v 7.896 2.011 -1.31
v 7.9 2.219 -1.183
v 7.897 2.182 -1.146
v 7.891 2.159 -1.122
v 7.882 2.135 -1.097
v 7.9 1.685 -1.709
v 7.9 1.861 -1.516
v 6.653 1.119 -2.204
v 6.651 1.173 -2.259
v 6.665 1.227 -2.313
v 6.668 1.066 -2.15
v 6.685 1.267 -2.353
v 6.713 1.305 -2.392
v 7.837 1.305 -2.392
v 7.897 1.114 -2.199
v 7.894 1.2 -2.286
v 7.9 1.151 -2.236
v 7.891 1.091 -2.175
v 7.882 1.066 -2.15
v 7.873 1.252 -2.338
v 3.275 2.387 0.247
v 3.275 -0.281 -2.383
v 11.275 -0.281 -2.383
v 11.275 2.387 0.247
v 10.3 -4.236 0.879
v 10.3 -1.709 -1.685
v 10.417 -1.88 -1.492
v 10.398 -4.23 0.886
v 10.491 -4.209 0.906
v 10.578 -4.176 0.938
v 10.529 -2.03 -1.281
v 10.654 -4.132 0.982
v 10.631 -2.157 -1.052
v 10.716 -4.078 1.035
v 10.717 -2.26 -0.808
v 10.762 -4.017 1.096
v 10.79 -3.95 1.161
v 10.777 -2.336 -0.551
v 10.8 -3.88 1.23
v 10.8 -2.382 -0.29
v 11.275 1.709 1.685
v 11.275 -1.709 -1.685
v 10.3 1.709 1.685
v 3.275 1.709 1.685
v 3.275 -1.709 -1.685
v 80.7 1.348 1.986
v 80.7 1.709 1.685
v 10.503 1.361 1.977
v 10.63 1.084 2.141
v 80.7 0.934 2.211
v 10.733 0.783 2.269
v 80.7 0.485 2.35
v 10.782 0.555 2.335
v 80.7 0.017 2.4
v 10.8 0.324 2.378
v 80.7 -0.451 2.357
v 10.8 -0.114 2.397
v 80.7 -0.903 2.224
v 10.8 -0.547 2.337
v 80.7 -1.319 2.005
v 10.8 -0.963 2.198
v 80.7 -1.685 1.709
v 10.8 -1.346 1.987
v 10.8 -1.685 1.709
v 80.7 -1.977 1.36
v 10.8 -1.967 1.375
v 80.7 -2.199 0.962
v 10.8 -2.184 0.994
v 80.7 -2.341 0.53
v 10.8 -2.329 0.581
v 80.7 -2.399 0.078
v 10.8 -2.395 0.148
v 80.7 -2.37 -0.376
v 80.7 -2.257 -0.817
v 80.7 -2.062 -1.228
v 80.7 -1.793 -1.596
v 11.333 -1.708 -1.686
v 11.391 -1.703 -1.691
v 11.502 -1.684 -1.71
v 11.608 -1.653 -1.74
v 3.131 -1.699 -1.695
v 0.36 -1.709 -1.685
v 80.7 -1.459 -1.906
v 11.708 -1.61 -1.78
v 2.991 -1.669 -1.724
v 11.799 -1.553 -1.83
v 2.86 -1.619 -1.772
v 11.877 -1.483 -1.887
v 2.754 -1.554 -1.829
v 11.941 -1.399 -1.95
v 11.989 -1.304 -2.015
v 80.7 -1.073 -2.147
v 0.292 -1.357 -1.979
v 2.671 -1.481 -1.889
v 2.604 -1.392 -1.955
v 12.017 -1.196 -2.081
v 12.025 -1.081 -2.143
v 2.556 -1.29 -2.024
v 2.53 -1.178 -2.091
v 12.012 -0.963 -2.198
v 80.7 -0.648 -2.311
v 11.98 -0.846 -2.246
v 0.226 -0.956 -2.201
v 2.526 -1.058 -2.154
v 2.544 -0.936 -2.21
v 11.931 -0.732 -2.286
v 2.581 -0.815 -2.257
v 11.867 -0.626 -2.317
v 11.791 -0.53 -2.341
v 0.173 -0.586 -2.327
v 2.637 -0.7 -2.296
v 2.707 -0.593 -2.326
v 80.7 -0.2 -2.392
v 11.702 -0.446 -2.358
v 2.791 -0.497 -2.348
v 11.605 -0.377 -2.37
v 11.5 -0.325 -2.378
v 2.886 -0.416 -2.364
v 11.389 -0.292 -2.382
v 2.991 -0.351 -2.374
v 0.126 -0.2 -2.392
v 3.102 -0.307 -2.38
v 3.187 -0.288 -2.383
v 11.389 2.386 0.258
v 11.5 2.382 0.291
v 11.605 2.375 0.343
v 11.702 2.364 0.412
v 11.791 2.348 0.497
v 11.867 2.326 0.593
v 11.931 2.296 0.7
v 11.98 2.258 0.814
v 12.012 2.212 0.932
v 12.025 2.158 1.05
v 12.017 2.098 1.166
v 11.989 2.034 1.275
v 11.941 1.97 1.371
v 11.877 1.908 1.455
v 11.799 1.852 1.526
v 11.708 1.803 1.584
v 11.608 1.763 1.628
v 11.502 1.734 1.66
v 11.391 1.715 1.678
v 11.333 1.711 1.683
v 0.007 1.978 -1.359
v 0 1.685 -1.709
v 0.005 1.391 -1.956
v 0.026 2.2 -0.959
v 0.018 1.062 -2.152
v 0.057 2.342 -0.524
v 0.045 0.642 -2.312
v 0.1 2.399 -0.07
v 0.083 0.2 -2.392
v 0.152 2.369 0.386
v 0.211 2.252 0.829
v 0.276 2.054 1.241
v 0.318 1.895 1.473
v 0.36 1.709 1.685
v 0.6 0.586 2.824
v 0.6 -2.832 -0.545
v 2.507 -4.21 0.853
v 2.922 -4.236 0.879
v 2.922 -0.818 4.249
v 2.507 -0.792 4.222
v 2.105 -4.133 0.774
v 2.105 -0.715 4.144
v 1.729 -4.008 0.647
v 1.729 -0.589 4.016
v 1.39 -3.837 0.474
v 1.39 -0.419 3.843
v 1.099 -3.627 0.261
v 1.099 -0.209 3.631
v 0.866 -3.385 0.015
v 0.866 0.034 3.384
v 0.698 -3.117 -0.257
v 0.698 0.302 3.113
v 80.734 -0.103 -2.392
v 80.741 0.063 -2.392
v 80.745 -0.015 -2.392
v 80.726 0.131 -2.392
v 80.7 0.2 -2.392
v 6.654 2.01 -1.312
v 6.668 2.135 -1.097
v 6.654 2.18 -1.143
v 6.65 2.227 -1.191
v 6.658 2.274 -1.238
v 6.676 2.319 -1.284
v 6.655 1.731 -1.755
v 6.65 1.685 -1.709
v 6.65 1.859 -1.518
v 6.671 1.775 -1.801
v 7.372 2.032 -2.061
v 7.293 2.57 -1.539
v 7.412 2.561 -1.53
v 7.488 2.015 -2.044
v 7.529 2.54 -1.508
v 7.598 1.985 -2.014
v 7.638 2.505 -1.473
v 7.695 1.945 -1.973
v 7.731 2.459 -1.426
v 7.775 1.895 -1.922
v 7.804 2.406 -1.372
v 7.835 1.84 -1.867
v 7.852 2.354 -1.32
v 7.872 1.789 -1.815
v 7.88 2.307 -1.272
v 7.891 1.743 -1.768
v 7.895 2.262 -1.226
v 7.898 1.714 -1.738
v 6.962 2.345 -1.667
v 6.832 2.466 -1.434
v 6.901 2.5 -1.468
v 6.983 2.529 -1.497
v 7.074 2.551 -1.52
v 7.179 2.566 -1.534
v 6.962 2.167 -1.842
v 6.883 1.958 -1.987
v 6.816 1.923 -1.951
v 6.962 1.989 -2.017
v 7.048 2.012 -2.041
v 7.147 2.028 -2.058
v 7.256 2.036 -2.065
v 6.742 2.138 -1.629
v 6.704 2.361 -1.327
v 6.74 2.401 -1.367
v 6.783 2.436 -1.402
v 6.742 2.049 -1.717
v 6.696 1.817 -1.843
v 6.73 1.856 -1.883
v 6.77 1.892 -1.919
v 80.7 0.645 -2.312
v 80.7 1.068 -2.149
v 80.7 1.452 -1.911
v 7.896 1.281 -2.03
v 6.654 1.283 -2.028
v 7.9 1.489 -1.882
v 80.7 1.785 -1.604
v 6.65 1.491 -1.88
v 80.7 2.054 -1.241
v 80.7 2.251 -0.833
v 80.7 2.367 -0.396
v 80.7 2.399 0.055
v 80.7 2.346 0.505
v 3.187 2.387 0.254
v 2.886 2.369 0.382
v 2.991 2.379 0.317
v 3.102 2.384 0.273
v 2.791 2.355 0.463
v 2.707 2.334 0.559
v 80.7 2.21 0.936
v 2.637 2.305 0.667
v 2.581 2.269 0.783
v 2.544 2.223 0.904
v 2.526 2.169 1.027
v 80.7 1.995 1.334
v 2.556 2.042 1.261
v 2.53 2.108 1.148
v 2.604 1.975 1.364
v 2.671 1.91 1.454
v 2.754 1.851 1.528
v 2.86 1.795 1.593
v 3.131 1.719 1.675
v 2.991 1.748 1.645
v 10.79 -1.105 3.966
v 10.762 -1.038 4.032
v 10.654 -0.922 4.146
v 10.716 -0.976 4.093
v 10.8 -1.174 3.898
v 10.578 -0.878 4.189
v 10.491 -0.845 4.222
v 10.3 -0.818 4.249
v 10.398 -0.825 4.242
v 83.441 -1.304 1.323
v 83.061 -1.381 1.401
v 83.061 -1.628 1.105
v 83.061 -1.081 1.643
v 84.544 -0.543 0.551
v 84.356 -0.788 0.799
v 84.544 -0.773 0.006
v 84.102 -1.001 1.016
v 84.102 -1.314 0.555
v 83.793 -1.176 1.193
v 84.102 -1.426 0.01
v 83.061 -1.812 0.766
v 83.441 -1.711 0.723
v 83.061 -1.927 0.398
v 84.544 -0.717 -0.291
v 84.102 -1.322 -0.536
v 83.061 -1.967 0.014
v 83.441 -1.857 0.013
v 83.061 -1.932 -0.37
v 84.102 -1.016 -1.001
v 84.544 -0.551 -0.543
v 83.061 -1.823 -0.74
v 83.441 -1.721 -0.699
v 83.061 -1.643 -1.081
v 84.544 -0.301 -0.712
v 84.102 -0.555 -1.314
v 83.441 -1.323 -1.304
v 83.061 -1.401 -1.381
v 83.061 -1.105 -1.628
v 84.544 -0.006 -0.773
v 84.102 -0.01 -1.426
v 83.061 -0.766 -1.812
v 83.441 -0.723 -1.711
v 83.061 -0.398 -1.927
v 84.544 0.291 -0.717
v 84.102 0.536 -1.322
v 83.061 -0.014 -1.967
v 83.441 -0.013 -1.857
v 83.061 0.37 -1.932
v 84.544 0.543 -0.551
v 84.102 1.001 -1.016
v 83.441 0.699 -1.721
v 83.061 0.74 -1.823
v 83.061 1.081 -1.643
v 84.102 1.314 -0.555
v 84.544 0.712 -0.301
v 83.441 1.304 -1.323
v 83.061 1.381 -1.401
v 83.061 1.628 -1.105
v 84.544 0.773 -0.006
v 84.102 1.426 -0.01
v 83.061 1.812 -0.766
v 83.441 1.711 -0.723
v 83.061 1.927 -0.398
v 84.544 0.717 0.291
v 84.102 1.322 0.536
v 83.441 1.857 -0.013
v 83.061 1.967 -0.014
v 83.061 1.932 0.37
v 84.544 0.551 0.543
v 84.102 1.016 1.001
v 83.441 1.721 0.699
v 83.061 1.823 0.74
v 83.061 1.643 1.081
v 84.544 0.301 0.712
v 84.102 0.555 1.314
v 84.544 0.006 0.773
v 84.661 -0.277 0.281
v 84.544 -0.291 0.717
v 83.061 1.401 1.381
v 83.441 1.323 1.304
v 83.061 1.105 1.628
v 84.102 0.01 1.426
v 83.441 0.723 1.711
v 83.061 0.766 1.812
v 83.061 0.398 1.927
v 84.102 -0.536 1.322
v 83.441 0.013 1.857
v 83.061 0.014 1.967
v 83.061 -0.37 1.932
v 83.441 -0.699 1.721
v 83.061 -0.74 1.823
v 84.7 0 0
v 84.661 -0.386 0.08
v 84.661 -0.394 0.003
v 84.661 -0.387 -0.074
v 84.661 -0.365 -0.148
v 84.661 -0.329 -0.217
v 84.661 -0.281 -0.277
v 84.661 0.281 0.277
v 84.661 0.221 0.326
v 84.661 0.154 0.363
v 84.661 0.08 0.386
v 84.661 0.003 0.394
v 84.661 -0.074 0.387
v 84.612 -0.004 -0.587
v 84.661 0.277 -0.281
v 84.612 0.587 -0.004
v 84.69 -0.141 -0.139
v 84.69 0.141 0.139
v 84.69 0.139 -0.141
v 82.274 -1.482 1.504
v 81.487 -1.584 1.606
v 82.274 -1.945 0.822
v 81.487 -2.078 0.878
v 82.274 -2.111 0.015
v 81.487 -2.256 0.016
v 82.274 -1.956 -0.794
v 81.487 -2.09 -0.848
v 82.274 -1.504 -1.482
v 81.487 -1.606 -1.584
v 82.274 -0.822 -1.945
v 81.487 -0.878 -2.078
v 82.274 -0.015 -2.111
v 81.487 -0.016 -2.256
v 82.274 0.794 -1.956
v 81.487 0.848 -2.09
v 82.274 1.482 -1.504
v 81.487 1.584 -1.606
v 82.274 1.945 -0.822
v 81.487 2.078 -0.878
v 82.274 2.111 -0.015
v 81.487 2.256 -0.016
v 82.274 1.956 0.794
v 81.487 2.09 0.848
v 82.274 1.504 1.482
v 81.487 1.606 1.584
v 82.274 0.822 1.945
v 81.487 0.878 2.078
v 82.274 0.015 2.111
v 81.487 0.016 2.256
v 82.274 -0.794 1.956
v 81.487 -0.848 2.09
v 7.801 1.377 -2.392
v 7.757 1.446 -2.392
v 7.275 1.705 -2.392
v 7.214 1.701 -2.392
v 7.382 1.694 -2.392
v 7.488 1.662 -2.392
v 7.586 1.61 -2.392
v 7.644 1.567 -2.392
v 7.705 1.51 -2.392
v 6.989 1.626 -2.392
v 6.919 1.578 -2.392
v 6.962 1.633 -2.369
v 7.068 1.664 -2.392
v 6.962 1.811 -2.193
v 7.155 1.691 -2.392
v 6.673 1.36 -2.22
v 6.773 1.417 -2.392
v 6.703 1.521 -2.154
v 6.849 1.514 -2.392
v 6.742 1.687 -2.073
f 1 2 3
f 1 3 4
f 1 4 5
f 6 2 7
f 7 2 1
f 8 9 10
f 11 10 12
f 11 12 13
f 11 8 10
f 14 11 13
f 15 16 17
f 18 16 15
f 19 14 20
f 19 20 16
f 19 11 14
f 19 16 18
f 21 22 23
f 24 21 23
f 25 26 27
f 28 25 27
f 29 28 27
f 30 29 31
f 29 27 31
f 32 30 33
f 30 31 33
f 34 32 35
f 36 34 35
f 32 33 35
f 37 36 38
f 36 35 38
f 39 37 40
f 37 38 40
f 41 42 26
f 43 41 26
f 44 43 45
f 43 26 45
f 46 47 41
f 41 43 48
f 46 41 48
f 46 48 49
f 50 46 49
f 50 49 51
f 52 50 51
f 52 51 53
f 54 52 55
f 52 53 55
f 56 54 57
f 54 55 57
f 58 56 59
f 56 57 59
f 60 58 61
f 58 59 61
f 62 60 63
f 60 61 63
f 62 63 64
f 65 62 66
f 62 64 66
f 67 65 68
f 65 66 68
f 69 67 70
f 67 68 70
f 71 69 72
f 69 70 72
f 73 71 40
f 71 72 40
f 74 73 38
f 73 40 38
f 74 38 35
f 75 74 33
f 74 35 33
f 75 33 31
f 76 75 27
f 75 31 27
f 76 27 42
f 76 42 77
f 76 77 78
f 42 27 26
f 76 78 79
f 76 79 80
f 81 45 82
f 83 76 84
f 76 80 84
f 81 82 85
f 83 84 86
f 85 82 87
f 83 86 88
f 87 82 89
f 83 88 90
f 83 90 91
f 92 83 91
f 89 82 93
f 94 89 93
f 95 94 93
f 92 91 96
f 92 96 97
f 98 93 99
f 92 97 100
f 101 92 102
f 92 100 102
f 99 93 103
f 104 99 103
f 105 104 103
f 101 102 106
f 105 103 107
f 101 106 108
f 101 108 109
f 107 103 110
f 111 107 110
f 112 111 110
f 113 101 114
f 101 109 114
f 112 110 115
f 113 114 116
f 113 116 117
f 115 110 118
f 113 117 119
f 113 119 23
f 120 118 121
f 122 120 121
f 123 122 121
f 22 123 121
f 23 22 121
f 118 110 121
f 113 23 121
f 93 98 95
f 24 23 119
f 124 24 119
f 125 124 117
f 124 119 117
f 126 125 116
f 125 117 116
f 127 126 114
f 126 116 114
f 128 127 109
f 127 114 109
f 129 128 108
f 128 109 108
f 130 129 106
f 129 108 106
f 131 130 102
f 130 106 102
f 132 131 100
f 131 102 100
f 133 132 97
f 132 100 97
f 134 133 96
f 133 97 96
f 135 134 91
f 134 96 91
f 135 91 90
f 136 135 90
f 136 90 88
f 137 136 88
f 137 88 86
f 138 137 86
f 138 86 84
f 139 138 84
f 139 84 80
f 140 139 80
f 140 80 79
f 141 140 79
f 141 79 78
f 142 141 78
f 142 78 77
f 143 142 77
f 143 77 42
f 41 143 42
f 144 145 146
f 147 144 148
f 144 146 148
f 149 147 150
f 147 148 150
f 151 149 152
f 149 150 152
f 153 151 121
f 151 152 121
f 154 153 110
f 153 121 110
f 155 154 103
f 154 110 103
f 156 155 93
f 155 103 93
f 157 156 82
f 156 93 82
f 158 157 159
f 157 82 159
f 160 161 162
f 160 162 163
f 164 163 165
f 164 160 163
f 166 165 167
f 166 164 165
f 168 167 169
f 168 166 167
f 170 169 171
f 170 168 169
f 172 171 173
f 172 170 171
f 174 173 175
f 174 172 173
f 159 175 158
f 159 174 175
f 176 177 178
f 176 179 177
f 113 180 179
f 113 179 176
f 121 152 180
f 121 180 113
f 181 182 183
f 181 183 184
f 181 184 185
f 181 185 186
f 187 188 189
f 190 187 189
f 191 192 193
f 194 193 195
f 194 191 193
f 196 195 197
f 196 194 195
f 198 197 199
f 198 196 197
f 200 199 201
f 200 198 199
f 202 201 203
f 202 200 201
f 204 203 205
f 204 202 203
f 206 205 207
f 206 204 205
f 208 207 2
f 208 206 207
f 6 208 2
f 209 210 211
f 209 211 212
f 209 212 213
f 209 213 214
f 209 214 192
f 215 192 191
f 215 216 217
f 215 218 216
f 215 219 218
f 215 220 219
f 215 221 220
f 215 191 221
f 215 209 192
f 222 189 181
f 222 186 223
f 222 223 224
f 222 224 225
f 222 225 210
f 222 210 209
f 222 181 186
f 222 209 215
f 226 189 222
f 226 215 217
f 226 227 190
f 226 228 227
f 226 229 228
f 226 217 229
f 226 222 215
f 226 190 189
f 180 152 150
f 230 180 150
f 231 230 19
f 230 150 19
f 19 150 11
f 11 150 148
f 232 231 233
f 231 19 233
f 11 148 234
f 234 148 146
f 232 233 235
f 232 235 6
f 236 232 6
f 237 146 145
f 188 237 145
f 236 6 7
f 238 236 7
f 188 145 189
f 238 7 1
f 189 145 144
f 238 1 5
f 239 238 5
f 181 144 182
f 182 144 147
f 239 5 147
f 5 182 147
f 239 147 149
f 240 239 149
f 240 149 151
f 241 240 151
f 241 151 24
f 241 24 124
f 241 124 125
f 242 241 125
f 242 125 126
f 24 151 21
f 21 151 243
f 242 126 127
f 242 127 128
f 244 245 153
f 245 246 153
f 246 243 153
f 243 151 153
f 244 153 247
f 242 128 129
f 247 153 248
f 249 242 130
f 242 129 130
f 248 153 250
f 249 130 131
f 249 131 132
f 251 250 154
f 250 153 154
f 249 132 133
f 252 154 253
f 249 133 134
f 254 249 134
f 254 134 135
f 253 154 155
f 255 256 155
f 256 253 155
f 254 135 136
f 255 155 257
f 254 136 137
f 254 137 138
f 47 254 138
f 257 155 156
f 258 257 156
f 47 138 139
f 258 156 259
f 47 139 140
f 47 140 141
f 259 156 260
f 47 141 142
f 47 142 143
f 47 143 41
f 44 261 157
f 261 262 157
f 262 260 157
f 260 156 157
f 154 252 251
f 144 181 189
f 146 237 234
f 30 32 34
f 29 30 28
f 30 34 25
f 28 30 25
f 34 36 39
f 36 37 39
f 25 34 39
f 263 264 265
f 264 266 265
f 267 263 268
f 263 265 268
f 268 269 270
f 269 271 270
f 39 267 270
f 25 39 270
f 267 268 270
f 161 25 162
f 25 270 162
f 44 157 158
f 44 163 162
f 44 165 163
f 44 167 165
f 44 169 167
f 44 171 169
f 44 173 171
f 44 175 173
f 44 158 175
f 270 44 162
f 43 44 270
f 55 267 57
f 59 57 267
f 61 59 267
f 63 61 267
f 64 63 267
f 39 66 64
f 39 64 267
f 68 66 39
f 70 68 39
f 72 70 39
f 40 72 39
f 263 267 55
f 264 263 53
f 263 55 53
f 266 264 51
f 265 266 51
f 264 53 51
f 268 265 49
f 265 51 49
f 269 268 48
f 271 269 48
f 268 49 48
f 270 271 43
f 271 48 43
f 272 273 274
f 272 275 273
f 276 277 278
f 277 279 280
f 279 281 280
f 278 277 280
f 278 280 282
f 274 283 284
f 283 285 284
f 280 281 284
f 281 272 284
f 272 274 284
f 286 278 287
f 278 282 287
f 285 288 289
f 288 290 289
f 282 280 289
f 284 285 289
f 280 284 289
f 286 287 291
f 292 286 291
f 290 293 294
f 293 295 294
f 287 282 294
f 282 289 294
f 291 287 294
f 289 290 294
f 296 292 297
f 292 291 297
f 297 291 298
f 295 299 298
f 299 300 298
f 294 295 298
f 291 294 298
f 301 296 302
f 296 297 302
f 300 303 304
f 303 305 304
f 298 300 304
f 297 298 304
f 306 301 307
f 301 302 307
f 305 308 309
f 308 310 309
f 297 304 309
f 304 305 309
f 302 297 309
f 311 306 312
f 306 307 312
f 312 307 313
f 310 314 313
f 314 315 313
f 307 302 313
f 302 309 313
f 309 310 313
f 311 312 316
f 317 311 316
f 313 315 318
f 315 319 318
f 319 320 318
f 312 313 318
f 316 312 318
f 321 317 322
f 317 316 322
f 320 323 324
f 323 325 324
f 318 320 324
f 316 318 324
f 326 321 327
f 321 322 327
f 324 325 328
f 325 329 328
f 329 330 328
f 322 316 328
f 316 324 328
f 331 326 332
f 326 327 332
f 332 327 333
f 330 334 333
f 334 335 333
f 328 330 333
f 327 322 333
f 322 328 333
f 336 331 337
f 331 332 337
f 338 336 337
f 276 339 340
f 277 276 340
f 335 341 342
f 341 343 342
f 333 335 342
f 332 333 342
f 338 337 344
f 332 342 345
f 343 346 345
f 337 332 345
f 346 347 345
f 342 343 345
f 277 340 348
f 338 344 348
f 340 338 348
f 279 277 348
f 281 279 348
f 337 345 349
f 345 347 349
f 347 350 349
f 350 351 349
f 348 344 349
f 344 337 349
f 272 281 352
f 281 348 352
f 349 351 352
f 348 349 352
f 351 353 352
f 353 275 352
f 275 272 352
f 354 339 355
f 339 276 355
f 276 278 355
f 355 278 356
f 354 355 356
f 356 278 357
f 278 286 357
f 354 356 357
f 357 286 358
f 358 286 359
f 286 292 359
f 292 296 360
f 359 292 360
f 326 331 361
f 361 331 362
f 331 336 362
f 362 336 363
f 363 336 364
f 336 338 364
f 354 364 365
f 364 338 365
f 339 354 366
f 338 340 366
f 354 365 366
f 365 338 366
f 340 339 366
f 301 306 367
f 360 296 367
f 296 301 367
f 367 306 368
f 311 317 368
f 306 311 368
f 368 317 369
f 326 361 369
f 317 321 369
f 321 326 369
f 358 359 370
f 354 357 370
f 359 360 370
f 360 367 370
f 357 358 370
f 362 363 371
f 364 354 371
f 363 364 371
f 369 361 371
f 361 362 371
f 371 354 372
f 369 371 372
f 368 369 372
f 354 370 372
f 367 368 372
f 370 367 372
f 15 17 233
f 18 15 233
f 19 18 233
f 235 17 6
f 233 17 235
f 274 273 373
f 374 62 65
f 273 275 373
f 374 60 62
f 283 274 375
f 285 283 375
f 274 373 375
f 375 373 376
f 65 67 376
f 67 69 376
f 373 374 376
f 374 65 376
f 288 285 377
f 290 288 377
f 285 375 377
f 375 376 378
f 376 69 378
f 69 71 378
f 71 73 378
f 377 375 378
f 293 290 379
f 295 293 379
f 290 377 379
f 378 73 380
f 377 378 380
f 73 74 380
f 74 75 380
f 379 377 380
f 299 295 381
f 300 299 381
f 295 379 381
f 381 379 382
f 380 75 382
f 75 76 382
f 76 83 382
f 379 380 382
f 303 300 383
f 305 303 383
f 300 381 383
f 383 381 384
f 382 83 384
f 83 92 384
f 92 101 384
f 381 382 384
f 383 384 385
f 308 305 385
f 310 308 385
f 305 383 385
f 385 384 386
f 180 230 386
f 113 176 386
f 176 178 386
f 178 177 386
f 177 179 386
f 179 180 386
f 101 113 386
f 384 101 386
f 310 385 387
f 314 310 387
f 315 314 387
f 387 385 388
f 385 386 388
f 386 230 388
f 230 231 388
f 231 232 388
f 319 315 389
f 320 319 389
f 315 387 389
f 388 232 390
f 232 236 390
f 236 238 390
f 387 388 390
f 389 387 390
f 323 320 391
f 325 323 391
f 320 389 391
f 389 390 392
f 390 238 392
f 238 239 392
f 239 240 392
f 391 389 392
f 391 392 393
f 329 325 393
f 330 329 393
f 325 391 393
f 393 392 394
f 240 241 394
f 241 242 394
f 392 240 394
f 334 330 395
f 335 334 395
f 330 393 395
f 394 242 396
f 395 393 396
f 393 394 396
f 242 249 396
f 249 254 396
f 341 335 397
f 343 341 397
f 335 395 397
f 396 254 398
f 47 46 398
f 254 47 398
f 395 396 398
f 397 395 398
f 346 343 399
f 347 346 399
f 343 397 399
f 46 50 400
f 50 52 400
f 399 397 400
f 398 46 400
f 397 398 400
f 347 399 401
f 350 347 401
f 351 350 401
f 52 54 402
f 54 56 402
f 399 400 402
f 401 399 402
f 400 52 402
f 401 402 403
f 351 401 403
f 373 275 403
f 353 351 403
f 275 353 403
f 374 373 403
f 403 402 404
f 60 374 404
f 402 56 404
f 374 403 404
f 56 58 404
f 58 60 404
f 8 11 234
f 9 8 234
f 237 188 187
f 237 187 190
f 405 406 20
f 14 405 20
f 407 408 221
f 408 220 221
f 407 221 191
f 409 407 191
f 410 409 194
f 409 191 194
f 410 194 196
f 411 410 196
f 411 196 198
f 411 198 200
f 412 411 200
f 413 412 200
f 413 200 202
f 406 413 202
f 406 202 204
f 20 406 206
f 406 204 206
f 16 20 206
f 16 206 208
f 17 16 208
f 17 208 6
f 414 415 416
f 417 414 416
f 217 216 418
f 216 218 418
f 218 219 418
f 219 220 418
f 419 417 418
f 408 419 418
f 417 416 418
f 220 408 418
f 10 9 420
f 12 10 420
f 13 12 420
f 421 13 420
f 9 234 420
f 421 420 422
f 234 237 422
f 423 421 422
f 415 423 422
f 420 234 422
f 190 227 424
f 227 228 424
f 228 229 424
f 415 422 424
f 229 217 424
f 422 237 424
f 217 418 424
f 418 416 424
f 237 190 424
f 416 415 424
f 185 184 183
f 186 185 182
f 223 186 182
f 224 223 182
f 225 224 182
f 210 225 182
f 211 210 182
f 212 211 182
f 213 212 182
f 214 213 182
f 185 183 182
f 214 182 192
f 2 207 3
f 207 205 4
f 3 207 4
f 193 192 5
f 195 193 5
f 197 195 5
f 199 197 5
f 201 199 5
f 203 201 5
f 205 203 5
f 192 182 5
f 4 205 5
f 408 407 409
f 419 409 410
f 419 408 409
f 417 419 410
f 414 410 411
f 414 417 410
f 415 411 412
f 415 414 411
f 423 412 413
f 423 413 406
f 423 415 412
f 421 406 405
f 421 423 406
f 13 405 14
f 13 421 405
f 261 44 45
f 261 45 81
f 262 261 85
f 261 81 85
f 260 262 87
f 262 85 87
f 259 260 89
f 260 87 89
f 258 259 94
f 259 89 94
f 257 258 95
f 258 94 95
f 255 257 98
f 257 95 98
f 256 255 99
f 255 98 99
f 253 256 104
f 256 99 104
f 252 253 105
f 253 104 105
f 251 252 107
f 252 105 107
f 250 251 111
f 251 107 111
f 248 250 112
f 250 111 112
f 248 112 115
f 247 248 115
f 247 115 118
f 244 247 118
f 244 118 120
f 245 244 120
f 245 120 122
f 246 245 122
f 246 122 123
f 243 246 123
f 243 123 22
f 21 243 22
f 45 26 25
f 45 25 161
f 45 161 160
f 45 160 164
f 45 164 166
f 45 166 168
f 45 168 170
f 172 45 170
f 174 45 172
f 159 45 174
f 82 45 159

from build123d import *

# Parameters (mm, degrees)
SKETCH_R             = 2.4
PAD_DEPTH            = 84.7
PAD001_DEPTH         = 3.6
POCKET_DEPTH         = 5
PAD002_DEPTH         = 0.75
PAD002_DEPTH_BACK    = 0.75
POCKET001_DEPTH      = 10
POCKET002_DEPTH      = 100
POCKET002_DEPTH_BACK = -100
BODY_PLACEMENT_ANGLE = 44.59


with BuildPart() as part:
    # Sketch → Pad (new body)
    with BuildSketch(Plane.YZ):
        Circle(SKETCH_R)
    extrude(amount=PAD_DEPTH)

    # Sketch001 → Pad001 (join)
    with BuildSketch(Plane.XY):
        with BuildLine():
            Line((0, 2.4), (10.3, 2.4))
            ThreePointArc((10.8, 1.9), (10.653553, 2.253553), (10.3, 2.4))
            Line((10.8, 1.9), (10.8, -1.9))
            ThreePointArc((10.3, -2.4), (10.653553, -2.253553), (10.8, -1.9))
            Line((10.3, -2.4), (0, -2.4))
            Line((0, -2.4), (0, 2.4))
        make_face()
    extrude(amount=PAD001_DEPTH)

    # Sketch002 (on Face7 of Pad001) → Pocket (cut)
    with BuildSketch(Plane(origin=(0, -2.4, 0), x_dir=(0, 0, -1), z_dir=(0, -1, 0))):
        with BuildLine():
            Line((2.4, 0), (-1.6, 0.6))
            ThreePointArc((-3.6, 2.922375), (-3.031088, 1.38994), (-1.6, 0.6))
            Line((-3.6, 2.922375), (-4.6, 2.922375))
            Line((-4.6, 2.922375), (-4.6, -1))
            Line((-4.6, -1), (2.4, -1))
            Line((2.4, -1), (2.4, 0))
        make_face()
    extrude(amount=-POCKET_DEPTH, mode=Mode.SUBTRACT)

    # Sketch003 → Pad002 (join, two sides)
    with BuildSketch(Plane.XZ) as pad002_sk:
        with BuildLine():
            add(Edge.make_bspline(
                [(7.9, -2.4), (7.9, -1.533975), (6.9625, -1.966987), (6.025, -2.4), (6.9625, -2.833013), (7.9, -3.266025), (7.9, -2.4)],
                knots=[0, 0, 0, 2.094395, 2.094395, 4.18879, 4.18879, 6.283185, 6.283185, 6.283185], degree=2, weights=[1, 0.5, 1, 0.5, 1, 0.5, 1]))
        make_face()
    extrude(amount=PAD002_DEPTH)
    extrude(pad002_sk.sketch, amount=-PAD002_DEPTH_BACK)

    # Sketch004 (on Face6 of Pad002) → Pocket001 (cut)
    with BuildSketch(Plane(origin=(0, -2.4, 0), x_dir=(0, 0, -1), z_dir=(0, -1, 0))):
        with BuildLine():
            ThreePointArc((0, 3.275), (0.75, 2.525), (1.5, 3.275))
            Line((1.5, 3.275), (1.5, 11.275))
            ThreePointArc((1.5, 11.275), (0.75, 12.025), (0, 11.275))
            Line((0, 11.275), (0, 3.275))
        make_face()
    extrude(amount=-POCKET001_DEPTH, mode=Mode.SUBTRACT)

    # Sketch005 → Groove (revolve, cut)
    with BuildSketch(Plane.XZ):
        with BuildLine():
            ThreePointArc((84.7, 0), (84.236443, 1.280369), (83.060655, 1.967214))
            Line((83.060655, 1.967214), (80.7, 2.4))
            Line((80.7, 2.4), (84.7, 2.4))
            Line((84.7, 2.4), (85.7, 2.4))
            Line((85.7, 2.4), (85.7, 0))
            Line((85.7, 0), (84.7, 0))
        make_face()
    revolve(axis=Axis((0, 0, 0), (1, 0, 0)), mode=Mode.SUBTRACT)

    # Sketch006 → Pocket002 (cut, two sides)
    with BuildSketch(Plane.YZ) as pocket002_sk:
        Polygon((-1.821564, -1.56266), (-1.821564, -2.9), (-0.465163, -2.9), align=None)
    extrude(amount=-POCKET002_DEPTH, mode=Mode.SUBTRACT)
    extrude(pocket002_sk.sketch, amount=-POCKET002_DEPTH_BACK, mode=Mode.SUBTRACT)


with BuildPart() as part_1:
    # Body placement: moved
    add(part.part.rotate(Axis((0, 0, 0), (1, 0, 0)), BODY_PLACEMENT_ANGLE))


solid = part_1.part
